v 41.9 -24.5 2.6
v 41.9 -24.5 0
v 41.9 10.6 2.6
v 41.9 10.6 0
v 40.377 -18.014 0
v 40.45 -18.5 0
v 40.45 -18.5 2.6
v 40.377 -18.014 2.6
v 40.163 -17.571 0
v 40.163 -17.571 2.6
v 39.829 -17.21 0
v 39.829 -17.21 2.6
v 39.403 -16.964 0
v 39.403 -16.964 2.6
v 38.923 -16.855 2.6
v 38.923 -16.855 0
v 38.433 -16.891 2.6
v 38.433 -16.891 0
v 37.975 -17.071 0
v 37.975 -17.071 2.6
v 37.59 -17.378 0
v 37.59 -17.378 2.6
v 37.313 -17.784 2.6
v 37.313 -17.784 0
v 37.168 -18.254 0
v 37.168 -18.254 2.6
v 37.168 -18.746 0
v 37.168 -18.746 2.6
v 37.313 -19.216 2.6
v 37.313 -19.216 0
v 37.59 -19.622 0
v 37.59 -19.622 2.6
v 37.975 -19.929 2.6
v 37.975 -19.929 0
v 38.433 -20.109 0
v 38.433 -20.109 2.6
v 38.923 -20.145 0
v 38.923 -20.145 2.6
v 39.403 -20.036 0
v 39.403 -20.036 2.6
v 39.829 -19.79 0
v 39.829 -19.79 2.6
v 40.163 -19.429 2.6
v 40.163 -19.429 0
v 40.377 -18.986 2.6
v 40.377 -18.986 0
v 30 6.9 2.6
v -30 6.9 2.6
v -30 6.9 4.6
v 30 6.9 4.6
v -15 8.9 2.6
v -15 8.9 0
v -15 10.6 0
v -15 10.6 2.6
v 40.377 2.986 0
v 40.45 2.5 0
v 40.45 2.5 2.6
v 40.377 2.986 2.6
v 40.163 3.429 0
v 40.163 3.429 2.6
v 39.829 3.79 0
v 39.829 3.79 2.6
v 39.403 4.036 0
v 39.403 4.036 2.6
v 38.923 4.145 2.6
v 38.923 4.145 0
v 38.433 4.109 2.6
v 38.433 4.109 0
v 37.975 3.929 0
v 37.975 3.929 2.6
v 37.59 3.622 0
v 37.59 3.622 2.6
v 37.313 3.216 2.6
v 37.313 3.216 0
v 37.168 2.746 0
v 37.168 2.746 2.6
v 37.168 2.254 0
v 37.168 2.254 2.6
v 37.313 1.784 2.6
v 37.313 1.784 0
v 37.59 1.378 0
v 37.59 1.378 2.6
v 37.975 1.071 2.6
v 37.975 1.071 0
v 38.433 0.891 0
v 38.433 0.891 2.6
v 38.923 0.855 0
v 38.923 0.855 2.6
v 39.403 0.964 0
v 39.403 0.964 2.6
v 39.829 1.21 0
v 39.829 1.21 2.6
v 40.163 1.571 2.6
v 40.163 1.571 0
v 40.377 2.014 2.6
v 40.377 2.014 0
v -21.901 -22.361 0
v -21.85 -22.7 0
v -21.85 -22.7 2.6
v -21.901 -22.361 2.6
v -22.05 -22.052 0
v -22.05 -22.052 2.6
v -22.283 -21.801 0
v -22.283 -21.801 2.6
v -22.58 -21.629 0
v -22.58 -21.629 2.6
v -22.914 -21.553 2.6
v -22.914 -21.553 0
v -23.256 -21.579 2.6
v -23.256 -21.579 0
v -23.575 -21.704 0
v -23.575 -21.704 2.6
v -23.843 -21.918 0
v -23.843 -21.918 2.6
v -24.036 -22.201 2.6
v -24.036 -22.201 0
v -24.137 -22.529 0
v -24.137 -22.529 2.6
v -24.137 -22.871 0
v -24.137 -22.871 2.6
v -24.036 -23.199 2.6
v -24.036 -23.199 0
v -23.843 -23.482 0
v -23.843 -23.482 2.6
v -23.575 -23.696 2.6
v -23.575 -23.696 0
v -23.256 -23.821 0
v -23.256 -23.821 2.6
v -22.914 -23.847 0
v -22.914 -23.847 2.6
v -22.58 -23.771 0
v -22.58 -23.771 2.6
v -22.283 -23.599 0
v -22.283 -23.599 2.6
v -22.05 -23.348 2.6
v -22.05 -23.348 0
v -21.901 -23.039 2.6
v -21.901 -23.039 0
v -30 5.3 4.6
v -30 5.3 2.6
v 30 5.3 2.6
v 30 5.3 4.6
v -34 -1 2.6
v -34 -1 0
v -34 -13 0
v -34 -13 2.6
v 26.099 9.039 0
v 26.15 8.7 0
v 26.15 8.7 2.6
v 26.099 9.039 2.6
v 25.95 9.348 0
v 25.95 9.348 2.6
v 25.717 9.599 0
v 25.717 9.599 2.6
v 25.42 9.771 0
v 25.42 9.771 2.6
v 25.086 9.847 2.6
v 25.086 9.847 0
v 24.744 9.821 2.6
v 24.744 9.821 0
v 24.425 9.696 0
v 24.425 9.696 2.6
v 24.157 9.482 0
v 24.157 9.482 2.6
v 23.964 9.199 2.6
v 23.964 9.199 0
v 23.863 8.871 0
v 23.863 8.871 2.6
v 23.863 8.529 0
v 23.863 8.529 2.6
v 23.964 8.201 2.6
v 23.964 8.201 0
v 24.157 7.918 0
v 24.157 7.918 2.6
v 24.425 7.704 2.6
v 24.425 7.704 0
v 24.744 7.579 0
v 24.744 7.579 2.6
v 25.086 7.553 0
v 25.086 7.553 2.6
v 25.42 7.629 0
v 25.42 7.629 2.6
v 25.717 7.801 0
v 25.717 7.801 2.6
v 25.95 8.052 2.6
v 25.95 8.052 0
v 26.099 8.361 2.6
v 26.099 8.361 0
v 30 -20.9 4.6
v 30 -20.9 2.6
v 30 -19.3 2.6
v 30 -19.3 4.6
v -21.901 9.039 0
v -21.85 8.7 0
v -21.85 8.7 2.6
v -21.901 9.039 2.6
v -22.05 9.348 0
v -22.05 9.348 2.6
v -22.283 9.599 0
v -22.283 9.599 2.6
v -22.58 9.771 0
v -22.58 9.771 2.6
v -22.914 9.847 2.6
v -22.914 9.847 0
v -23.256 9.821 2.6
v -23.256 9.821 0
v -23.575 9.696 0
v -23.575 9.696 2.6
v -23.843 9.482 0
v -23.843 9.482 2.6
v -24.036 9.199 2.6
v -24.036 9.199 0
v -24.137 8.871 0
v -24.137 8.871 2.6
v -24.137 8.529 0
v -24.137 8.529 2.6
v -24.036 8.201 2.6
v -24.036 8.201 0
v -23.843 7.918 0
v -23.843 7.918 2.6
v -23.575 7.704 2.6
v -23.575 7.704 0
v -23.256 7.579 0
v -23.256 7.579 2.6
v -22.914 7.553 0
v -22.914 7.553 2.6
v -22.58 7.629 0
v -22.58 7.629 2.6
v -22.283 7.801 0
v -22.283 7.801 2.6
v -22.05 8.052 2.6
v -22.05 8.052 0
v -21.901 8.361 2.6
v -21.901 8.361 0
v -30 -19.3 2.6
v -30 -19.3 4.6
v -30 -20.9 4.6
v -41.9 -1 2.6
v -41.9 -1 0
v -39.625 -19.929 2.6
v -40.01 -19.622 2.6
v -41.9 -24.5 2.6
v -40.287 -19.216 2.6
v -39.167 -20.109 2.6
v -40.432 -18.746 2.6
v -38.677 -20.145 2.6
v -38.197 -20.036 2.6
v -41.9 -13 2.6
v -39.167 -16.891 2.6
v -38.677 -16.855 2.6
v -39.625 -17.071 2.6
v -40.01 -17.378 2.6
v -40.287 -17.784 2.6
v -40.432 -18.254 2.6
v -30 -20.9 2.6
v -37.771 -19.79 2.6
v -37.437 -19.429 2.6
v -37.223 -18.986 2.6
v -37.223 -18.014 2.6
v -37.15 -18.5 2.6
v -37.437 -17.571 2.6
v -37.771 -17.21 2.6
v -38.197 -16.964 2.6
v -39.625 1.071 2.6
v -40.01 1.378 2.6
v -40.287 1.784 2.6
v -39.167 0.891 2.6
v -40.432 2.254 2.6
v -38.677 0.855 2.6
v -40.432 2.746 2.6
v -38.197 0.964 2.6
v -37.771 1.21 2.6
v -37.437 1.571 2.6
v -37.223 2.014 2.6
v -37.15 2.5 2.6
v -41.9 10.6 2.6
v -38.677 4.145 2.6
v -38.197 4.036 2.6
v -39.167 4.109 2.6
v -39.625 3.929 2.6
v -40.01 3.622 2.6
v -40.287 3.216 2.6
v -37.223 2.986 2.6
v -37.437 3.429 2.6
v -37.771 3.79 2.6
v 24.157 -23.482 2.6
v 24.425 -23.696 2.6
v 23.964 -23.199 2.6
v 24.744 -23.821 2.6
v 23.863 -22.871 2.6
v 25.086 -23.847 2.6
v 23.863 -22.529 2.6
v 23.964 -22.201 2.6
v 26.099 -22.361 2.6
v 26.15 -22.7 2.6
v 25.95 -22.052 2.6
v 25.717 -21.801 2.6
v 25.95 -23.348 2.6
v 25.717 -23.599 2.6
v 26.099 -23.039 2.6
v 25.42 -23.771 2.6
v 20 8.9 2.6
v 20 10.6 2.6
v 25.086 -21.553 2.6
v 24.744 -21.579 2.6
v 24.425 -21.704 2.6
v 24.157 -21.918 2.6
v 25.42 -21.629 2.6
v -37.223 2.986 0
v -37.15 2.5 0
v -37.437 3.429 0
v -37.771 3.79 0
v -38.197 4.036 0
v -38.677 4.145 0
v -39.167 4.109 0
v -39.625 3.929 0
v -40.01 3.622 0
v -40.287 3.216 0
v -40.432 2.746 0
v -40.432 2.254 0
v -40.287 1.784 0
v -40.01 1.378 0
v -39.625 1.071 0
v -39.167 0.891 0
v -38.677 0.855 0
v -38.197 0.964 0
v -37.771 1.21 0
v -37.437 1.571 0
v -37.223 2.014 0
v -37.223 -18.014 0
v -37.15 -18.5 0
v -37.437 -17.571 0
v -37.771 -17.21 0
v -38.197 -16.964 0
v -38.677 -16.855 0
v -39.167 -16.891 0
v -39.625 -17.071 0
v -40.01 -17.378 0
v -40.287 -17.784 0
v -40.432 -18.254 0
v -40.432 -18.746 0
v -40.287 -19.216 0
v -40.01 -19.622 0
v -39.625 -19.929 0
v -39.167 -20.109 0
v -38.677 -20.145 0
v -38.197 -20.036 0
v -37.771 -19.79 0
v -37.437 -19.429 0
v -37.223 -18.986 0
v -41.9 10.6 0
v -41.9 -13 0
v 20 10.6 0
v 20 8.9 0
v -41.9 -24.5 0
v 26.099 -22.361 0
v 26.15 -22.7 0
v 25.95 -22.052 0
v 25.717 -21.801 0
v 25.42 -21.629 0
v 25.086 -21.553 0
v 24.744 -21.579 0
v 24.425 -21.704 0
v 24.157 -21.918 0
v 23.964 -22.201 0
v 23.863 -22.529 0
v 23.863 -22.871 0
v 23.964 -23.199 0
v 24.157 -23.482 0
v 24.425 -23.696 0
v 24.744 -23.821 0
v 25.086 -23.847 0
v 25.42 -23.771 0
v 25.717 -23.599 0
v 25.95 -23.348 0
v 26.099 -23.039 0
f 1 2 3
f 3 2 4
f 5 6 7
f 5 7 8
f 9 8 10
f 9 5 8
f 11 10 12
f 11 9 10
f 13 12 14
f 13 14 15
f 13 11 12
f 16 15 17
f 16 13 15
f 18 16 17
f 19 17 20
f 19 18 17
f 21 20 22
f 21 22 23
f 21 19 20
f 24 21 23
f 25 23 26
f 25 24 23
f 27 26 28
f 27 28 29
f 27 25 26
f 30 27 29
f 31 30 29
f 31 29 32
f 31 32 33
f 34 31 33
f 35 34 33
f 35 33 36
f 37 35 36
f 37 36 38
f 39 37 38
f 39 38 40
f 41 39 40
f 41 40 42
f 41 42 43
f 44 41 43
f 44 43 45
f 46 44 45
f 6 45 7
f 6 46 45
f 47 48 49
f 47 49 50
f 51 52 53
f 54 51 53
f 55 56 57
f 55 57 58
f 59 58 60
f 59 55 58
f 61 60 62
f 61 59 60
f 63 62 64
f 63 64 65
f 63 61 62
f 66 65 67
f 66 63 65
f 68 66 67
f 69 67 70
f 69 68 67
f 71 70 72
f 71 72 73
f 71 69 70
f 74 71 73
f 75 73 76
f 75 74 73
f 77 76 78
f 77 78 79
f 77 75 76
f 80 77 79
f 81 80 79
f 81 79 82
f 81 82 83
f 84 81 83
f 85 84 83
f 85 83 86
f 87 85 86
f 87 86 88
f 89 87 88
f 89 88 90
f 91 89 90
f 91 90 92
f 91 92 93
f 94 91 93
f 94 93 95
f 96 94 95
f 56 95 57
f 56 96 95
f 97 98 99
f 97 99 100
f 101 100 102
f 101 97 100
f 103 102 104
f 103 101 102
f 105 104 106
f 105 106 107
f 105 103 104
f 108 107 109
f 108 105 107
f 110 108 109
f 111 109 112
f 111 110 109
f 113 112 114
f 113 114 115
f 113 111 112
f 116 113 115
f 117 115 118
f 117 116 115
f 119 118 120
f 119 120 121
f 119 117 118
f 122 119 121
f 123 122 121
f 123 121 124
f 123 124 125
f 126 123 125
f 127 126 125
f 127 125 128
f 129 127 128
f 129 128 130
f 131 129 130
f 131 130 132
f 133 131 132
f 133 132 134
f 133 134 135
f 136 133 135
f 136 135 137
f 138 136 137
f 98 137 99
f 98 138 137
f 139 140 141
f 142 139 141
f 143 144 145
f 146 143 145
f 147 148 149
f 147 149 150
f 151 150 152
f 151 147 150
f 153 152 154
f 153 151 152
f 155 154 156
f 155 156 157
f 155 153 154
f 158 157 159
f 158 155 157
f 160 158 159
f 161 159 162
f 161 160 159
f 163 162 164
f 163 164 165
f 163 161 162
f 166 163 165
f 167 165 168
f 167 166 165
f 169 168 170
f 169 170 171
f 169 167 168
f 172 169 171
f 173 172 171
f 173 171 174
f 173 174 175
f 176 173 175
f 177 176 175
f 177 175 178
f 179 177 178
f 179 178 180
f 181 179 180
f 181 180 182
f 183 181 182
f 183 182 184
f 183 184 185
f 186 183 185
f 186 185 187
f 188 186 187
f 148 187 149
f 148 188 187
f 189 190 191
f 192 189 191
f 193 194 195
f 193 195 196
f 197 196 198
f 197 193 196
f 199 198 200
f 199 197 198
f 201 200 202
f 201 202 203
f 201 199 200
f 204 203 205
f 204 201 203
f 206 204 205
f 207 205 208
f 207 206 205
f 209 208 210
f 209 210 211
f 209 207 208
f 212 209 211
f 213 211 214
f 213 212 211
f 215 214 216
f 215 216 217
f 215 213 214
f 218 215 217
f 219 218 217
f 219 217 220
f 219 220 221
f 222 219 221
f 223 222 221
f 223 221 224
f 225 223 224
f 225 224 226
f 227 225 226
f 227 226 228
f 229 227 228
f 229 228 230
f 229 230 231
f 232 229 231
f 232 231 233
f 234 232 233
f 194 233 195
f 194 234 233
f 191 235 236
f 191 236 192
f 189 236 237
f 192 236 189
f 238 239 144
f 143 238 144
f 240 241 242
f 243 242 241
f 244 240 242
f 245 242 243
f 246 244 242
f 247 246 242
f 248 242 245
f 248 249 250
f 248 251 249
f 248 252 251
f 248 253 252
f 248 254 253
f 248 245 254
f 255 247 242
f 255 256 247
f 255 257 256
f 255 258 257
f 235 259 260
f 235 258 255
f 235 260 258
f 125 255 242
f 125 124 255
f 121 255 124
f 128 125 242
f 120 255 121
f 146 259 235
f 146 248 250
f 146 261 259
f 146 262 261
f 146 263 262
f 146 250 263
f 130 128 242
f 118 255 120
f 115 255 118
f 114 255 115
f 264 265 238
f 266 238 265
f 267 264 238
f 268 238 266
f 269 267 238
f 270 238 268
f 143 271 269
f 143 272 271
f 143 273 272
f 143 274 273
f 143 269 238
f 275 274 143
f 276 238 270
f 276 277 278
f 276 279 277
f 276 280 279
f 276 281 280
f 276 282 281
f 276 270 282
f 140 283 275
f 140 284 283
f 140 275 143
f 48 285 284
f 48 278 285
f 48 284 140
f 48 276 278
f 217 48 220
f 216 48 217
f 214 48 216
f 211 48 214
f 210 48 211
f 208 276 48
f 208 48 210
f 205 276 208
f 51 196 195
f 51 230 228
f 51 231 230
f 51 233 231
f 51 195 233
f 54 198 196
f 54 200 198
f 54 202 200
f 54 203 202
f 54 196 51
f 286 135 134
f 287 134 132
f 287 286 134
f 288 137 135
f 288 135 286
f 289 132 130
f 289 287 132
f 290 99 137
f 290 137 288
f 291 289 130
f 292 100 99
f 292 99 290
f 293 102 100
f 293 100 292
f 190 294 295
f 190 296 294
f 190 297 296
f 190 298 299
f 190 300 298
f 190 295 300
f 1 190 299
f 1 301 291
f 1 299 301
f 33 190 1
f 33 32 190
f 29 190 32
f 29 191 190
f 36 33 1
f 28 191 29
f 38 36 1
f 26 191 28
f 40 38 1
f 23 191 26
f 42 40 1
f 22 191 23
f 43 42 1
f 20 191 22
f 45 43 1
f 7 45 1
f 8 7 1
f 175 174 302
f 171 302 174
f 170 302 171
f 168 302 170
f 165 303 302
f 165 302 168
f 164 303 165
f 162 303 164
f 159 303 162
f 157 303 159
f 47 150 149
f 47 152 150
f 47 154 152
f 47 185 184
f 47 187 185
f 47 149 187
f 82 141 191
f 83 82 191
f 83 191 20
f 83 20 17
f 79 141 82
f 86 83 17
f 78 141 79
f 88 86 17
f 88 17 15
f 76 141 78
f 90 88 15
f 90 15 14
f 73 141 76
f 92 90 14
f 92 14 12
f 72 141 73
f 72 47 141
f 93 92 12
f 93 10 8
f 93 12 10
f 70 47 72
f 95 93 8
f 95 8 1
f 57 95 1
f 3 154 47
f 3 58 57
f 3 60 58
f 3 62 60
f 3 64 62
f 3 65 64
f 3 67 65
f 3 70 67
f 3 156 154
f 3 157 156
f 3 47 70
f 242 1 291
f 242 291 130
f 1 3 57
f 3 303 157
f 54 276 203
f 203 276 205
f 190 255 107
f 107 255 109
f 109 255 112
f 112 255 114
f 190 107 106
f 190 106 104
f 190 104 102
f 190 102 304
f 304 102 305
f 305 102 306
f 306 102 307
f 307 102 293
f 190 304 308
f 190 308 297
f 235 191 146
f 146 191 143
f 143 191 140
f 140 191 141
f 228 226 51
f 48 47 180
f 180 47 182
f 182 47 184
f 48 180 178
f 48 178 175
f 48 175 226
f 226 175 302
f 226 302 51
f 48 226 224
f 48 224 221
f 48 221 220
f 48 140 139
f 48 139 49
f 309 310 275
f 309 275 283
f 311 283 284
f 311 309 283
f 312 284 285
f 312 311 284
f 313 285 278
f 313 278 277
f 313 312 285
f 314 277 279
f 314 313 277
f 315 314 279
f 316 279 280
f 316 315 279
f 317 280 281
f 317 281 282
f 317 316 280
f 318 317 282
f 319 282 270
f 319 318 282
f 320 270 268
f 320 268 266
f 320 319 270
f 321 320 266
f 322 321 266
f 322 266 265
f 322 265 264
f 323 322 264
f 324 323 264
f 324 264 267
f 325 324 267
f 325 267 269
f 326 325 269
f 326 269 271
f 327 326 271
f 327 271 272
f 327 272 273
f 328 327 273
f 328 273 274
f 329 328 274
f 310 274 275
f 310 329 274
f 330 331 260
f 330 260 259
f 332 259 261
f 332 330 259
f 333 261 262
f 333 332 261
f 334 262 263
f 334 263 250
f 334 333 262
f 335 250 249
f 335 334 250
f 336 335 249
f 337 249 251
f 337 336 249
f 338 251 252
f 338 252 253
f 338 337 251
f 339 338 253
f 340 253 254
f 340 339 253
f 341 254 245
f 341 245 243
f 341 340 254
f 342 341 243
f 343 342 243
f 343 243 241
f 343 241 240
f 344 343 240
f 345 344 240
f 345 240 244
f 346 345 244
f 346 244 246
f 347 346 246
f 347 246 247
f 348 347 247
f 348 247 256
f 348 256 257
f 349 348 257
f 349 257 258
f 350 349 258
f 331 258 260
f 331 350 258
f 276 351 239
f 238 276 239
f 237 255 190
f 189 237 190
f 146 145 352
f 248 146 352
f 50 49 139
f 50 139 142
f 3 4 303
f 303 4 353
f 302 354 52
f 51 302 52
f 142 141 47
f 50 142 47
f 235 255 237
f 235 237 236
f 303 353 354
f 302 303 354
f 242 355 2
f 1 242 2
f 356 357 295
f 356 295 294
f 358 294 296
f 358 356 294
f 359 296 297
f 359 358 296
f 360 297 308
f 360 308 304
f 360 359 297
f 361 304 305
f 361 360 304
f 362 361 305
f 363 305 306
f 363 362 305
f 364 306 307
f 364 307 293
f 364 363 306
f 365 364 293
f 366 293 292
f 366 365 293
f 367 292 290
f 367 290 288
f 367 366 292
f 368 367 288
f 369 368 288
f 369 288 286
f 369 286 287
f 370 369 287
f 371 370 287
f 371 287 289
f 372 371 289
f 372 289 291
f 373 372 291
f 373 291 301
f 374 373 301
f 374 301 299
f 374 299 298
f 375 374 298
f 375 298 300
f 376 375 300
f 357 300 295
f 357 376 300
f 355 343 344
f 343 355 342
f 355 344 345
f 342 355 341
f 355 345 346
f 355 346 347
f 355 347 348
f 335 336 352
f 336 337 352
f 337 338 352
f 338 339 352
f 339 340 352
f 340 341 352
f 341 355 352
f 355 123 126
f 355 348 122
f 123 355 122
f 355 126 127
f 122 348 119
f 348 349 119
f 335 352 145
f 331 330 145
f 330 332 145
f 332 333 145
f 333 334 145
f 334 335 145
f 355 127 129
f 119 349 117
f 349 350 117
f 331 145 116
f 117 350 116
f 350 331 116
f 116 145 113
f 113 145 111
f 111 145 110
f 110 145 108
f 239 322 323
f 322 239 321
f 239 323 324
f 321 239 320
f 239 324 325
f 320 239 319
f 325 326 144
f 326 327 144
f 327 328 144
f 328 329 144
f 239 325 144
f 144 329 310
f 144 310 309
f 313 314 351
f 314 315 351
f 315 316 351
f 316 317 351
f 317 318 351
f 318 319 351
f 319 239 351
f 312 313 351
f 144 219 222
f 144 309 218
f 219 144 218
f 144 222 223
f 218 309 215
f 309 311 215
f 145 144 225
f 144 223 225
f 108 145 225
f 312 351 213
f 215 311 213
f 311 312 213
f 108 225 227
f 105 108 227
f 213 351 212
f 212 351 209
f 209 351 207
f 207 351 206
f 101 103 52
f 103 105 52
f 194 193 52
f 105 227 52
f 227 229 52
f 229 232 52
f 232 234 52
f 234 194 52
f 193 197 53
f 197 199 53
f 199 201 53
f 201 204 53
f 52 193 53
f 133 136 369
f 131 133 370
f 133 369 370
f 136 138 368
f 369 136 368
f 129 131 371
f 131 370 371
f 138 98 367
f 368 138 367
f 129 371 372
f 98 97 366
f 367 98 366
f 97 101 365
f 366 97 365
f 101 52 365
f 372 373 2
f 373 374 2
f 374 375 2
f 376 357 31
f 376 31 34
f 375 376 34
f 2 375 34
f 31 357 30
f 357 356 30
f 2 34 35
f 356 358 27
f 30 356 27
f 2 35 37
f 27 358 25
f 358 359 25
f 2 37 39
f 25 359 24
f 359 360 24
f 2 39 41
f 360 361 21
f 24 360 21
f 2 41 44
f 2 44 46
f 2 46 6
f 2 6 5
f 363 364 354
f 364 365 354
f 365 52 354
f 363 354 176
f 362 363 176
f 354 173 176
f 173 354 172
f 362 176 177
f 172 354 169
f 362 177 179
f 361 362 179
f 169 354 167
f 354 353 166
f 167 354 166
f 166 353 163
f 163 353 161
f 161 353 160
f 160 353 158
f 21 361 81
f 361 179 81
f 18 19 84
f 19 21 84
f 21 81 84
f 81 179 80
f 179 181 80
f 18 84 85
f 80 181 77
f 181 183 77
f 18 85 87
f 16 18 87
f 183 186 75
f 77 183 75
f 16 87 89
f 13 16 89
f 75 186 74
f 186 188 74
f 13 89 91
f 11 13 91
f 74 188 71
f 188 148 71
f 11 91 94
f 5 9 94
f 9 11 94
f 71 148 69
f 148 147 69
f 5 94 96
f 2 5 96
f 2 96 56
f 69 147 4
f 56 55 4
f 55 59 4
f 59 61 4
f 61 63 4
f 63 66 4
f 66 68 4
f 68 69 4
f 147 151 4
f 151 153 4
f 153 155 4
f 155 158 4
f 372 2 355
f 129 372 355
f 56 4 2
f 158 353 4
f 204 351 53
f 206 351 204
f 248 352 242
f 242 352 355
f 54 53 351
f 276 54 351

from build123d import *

# Parameters (mm, degrees)
F_2_6_MM_REMOVABLE_SHELF_WIRING_NOTC_2_R       = 1.65
F_2_6_MM_REMOVABLE_SHELF_WIRING_NOTC_2_R_2     = 1.15
F_2_6_MM_REMOVABLE_SHELF_WIRING_NOTCH_AN_DEPTH = 2.6
CONTROLLER_START                               = 2.6
CONTROLLER_BOARD_EDGE_RESTS_PROFILE_W          = 60
CONTROLLER_BOARD_EDGE_RESTS_PROFILE_H          = 1.6
CONTROLLER_BOARD_EDGE_RESTS_DEPTH              = 2


with BuildPart() as part:
    # 2.6 mm removable shelf - wiring notc 2 → 2.6 mm removable shelf - wiring notch an (new body)
    with BuildSketch(Plane.XY):
        Polygon((-41.9, -24.5), (41.9, -24.5), (41.9, 10.6), (20, 10.6), (20, 8.9), (-15, 8.9), (-15, 10.6), (-41.9, 10.6), (-41.9, -1), (-34, -1), (-34, -13), (-41.9, -13), align=None)
        with Locations((-38.8, -18.5)):
            Circle(F_2_6_MM_REMOVABLE_SHELF_WIRING_NOTC_2_R, mode=Mode.SUBTRACT)
        with Locations((38.8, -18.5)):
            Circle(F_2_6_MM_REMOVABLE_SHELF_WIRING_NOTC_2_R, mode=Mode.SUBTRACT)
        with Locations((-38.8, 2.5)):
            Circle(F_2_6_MM_REMOVABLE_SHELF_WIRING_NOTC_2_R, mode=Mode.SUBTRACT)
        with Locations((38.8, 2.5)):
            Circle(F_2_6_MM_REMOVABLE_SHELF_WIRING_NOTC_2_R, mode=Mode.SUBTRACT)
        with Locations((-23, -22.7)):
            Circle(F_2_6_MM_REMOVABLE_SHELF_WIRING_NOTC_2_R_2, mode=Mode.SUBTRACT)
        with Locations((25, -22.7)):
            Circle(F_2_6_MM_REMOVABLE_SHELF_WIRING_NOTC_2_R_2, mode=Mode.SUBTRACT)
        with Locations((-23, 8.7)):
            Circle(F_2_6_MM_REMOVABLE_SHELF_WIRING_NOTC_2_R_2, mode=Mode.SUBTRACT)
        with Locations((25, 8.7)):
            Circle(F_2_6_MM_REMOVABLE_SHELF_WIRING_NOTC_2_R_2, mode=Mode.SUBTRACT)
    extrude(amount=F_2_6_MM_REMOVABLE_SHELF_WIRING_NOTCH_AN_DEPTH)

    # Controller board edge rests profile → Controller board edge rests (add)
    with BuildSketch(Plane.XY.offset(CONTROLLER_START)):
        with Locations((0, -20.1)):
            Rectangle(CONTROLLER_BOARD_EDGE_RESTS_PROFILE_W, CONTROLLER_BOARD_EDGE_RESTS_PROFILE_H)
        with Locations((0, 6.1)):
            Rectangle(CONTROLLER_BOARD_EDGE_RESTS_PROFILE_W, CONTROLLER_BOARD_EDGE_RESTS_PROFILE_H)
    extrude(amount=CONTROLLER_BOARD_EDGE_RESTS_DEPTH)


solid = part.part
